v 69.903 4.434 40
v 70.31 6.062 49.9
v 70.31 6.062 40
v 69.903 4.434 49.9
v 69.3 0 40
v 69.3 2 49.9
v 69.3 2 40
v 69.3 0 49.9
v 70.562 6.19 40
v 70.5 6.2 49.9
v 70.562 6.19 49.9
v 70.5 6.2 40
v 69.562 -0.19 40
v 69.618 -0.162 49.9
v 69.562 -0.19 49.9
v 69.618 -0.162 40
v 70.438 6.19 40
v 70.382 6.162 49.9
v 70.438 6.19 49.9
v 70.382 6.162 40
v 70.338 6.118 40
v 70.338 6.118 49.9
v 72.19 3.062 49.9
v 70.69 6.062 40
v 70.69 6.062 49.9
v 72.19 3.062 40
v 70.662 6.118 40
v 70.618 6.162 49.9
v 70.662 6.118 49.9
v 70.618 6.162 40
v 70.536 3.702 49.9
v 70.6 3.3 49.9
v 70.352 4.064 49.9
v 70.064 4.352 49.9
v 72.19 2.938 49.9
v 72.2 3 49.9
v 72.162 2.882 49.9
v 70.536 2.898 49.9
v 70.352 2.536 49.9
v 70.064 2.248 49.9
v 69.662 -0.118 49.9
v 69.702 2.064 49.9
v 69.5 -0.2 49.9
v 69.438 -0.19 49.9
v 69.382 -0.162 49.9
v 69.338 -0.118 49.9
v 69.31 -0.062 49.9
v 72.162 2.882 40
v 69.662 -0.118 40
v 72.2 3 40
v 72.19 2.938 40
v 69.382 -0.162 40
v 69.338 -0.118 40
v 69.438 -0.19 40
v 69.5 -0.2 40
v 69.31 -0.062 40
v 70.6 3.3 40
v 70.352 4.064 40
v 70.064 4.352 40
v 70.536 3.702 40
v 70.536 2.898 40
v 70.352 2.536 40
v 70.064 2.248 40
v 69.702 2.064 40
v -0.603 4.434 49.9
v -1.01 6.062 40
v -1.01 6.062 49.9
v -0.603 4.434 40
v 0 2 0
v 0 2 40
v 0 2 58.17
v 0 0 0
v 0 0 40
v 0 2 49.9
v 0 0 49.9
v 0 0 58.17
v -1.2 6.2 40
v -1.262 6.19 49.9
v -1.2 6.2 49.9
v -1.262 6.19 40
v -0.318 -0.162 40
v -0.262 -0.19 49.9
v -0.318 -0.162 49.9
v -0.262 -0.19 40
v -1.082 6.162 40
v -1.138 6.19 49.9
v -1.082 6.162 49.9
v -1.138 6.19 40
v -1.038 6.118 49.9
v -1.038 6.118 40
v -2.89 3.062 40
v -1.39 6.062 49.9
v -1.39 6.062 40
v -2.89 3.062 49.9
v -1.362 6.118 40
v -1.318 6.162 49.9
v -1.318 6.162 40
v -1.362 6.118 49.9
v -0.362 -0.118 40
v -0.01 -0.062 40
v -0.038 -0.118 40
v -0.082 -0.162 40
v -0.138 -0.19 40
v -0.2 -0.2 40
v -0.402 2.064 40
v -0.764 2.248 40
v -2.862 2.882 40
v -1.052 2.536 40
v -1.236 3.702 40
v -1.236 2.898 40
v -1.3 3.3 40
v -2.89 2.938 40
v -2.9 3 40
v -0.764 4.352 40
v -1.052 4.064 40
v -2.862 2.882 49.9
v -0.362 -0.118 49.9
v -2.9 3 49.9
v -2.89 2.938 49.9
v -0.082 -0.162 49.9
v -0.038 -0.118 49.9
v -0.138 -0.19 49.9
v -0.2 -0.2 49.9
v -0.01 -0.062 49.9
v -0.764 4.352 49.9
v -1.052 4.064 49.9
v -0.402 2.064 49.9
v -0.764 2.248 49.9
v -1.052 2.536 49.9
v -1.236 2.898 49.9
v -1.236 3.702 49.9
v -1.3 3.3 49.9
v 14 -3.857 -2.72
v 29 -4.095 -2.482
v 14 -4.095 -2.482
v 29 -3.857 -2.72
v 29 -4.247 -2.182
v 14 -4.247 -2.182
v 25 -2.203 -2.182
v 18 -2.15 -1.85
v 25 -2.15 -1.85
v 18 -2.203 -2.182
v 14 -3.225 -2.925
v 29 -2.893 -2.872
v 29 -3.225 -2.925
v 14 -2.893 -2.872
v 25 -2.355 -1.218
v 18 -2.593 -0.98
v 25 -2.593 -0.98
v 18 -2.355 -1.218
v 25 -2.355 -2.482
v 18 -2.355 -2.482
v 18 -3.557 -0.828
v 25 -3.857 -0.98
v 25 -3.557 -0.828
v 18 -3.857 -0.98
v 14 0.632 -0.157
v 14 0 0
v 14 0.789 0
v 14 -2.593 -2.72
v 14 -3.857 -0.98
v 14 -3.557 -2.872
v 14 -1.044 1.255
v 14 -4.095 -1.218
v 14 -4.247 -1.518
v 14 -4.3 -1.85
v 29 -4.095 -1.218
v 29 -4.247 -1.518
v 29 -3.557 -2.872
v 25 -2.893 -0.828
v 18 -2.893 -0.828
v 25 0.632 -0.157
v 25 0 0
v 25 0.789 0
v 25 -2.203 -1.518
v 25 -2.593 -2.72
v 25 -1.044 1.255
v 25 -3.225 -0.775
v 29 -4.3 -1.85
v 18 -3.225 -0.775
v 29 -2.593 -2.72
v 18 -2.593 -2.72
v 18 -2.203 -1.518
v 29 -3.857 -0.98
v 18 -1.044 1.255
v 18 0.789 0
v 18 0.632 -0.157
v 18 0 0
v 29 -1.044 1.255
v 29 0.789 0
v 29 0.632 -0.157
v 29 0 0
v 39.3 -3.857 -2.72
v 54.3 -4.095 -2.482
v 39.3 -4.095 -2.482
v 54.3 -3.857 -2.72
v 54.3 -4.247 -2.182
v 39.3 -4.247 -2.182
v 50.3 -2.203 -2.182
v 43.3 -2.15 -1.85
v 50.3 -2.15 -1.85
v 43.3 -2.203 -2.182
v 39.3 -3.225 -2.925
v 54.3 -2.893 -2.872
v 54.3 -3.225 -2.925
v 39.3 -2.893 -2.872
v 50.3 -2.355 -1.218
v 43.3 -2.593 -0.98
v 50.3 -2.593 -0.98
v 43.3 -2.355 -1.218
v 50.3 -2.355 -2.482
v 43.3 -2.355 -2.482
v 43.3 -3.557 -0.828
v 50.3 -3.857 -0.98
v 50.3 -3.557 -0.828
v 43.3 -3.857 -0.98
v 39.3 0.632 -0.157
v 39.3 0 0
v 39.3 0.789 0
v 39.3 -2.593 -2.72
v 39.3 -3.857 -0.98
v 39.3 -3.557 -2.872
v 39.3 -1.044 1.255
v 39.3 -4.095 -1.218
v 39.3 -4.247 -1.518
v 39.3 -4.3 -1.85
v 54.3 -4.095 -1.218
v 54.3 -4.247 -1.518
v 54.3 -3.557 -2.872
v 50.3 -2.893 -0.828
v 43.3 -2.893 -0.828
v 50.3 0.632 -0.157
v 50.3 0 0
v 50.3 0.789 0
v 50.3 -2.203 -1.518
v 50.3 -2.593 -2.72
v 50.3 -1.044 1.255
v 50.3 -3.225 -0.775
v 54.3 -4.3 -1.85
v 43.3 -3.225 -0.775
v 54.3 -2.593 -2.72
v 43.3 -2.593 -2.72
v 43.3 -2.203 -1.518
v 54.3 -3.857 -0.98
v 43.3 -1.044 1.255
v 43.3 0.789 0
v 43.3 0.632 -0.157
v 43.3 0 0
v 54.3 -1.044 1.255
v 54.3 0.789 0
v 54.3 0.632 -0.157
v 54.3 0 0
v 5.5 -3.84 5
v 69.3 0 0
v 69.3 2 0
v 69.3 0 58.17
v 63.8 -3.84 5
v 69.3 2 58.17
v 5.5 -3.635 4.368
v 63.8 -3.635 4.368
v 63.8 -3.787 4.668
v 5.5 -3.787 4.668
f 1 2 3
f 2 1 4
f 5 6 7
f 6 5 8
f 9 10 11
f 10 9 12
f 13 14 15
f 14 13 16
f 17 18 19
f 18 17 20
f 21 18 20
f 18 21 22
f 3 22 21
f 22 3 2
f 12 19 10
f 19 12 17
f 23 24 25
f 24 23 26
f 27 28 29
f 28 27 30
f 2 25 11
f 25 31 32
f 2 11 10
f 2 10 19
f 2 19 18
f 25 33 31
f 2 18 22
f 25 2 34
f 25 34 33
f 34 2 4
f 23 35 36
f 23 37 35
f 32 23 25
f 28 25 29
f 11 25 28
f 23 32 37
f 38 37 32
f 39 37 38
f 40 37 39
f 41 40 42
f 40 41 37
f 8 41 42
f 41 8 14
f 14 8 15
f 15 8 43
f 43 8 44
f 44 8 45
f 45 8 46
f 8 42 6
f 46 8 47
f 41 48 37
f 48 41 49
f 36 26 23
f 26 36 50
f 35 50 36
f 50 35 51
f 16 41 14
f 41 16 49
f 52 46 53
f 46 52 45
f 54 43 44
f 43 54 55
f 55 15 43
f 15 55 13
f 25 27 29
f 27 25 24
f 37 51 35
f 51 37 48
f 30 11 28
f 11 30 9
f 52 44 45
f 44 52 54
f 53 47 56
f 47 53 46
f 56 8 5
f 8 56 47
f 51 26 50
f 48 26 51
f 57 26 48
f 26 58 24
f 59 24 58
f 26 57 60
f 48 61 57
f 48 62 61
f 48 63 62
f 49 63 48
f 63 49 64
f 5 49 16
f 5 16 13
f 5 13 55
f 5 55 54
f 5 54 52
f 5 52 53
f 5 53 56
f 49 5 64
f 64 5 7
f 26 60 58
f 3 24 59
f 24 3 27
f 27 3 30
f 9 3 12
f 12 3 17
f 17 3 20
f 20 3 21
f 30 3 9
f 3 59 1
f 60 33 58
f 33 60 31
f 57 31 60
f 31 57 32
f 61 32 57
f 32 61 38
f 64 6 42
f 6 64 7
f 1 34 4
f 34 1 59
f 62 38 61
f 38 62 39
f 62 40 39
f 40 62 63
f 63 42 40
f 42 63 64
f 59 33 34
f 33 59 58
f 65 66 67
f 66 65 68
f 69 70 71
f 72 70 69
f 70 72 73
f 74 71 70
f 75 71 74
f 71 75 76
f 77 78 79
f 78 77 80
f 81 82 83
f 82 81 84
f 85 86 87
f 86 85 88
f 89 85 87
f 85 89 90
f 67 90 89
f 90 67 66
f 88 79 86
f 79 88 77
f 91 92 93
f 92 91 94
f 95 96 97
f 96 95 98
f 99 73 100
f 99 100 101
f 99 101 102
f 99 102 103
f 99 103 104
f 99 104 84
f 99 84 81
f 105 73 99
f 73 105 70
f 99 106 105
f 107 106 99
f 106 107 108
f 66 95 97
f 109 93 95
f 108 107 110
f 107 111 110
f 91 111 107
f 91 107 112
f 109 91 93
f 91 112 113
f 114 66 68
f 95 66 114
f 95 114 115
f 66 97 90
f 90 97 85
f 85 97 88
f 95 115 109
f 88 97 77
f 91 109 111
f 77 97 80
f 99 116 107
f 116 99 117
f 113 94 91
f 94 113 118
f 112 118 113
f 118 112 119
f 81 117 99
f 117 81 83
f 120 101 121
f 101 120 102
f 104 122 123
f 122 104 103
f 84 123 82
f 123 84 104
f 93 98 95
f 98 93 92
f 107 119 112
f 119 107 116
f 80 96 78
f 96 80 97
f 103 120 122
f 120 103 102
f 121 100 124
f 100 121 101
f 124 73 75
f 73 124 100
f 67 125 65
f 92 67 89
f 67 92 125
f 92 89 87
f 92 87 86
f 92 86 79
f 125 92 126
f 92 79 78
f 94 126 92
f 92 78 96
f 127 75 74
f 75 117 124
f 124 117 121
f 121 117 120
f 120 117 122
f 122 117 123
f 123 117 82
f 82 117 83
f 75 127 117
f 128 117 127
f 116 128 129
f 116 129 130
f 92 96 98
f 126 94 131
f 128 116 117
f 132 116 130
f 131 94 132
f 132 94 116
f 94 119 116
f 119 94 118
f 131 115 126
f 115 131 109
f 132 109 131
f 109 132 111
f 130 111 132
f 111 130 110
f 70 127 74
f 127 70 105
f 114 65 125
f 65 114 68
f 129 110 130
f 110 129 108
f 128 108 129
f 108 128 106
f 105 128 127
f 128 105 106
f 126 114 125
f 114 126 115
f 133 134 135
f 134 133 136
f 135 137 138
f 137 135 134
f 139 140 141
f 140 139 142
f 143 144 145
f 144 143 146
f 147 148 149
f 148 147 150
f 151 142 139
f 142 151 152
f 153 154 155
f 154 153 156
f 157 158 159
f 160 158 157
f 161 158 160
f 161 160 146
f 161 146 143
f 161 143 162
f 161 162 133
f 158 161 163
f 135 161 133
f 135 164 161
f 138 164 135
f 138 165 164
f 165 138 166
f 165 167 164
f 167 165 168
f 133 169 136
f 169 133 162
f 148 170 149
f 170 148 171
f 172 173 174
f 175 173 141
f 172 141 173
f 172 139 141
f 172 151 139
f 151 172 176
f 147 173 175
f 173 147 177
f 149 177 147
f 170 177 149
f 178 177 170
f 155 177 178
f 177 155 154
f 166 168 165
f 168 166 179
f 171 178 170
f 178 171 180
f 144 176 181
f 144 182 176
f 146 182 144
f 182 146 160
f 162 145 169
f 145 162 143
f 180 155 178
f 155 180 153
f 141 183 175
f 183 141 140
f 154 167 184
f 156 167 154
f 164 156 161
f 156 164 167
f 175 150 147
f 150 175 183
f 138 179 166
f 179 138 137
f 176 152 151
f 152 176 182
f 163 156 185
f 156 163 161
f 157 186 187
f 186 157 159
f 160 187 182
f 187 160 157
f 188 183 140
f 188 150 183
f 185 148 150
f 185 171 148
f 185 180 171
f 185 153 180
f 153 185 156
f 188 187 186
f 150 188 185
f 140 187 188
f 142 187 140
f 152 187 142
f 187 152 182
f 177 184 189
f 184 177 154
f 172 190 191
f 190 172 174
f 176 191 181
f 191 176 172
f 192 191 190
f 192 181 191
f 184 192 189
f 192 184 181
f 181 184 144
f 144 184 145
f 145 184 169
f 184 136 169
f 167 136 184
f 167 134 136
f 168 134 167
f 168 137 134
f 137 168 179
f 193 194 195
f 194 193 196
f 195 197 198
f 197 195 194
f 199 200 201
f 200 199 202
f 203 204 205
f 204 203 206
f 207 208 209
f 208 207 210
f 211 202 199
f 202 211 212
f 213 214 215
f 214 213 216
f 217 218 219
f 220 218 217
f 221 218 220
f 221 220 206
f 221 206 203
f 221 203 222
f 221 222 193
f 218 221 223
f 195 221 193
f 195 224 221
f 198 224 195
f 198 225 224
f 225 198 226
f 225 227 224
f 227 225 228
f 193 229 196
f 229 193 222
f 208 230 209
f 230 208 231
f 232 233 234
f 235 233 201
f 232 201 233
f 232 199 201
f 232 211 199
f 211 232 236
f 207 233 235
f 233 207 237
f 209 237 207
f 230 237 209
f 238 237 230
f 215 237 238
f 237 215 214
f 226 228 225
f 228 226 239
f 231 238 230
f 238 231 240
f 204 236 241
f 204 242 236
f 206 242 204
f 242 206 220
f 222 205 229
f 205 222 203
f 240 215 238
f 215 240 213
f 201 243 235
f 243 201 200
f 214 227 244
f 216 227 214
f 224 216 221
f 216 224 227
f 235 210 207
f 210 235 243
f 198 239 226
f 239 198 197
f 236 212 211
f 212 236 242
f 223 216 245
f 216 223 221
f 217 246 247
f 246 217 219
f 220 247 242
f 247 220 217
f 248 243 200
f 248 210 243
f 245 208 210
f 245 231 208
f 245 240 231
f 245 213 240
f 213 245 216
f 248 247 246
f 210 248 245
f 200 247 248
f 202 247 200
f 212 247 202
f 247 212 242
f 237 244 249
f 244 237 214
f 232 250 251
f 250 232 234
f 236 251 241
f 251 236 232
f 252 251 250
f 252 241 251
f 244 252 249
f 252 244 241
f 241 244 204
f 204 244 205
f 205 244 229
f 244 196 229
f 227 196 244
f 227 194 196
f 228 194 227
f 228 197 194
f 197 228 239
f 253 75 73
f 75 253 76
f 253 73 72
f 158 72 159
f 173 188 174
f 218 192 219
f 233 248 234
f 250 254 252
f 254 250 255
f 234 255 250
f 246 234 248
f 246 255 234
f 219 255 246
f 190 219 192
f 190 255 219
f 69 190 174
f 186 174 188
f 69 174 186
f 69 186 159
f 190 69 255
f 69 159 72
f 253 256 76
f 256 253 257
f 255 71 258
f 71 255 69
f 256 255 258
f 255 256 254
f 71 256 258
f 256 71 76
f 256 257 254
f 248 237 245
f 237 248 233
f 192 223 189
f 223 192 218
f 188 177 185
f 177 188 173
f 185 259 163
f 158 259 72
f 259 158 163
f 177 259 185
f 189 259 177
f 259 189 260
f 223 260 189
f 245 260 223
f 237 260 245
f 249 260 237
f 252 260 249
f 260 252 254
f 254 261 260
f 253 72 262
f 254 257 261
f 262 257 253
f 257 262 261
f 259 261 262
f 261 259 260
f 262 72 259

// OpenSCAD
DOOR_OUTER_WIDTH = 69.3;
FLOOR_TO_OUTER_HEIGHT = 58.17;
GATE_MATERIAL_HEIGHT = 2.0;
FLOOR_MATERIAL_HEIGHT = 3.85;

SIDE_CLIP_PETRUSION = 1.3;
SIDE_CLIP_PETRUSION_DEPTH = 2.0;
SIDE_CLIP_FROM_FLOOR = 40.0;
SIDE_CLIP_HEIGHT = 9.9;


// The ramp attachment
RAMP_ATTACH_DIAMETER = 2.15;
TAILGET_EDGE_TO_WALL = 9.1;
TAILGATE_EDGE_TO_INNER_ATTACHMENT= 5.45;
ATTACH_OFFSET_OUTER_WALL = 19.0;
ATTCH_LENGTH = 11.0;
RECESS_HEIGHT = FLOOR_MATERIAL_HEIGHT - GATE_MATERIAL_HEIGHT;
ATTACH_DISTANCE_FROM_RAMP = -TAILGET_EDGE_TO_WALL + TAILGATE_EDGE_TO_INNER_ATTACHMENT - RAMP_ATTACH_DIAMETER/2 + 1.5;


module latch() {
    difference() {
        translate([0.2,0,0])
            hull() {
                cylinder(h=SIDE_CLIP_HEIGHT, r=0.2, $fn = 20);
                translate([0,GATE_MATERIAL_HEIGHT,0])
                    cylinder(h=SIDE_CLIP_HEIGHT, r=0.2, $fn = 20);
                translate([1.0,GATE_MATERIAL_HEIGHT + SIDE_CLIP_PETRUSION_DEPTH * 2,0])
                    cylinder(h=SIDE_CLIP_HEIGHT, r=0.2, $fn = 20);
                translate([GATE_MATERIAL_HEIGHT*1.25,GATE_MATERIAL_HEIGHT+1.0,0])
                    cylinder(h=SIDE_CLIP_HEIGHT, r=0.2, $fn = 20);
            }
        translate([0,GATE_MATERIAL_HEIGHT+1.3,-0.1])
            cylinder(h=12.0,r=SIDE_CLIP_PETRUSION,$fn=20);
    }
}

module main_door() {
    hull() {
        cube([DOOR_OUTER_WIDTH,GATE_MATERIAL_HEIGHT,FLOOR_TO_OUTER_HEIGHT]);
        translate([ATTCH_LENGTH/2,ATTACH_DISTANCE_FROM_RAMP+0.46, 5])
            rotate([0,90,0])
                cylinder(h = DOOR_OUTER_WIDTH-ATTCH_LENGTH, r = RAMP_ATTACH_DIAMETER / 2.0, $fn = 20);
    }
    
    // Side attachments
    translate([DOOR_OUTER_WIDTH, 0, SIDE_CLIP_FROM_FLOOR])
        latch();
    translate([0, 0, SIDE_CLIP_FROM_FLOOR+SIDE_CLIP_HEIGHT])
        rotate([0,180,0]) latch();
    
    // Ramp attachment
    translate([ATTACH_OFFSET_OUTER_WALL-5.0,0,0]) ramp_attach();
    translate([DOOR_OUTER_WIDTH-ATTACH_OFFSET_OUTER_WALL-ATTCH_LENGTH,0,0])
        ramp_attach();
}

module ramp_attach() {        
    translate([0, ATTACH_DISTANCE_FROM_RAMP, -RECESS_HEIGHT])
        rotate([0,90,0])
            cylinder(h = ATTCH_LENGTH, r = RAMP_ATTACH_DIAMETER / 2.0, $fn = 20);
    
    hull() {
        translate([0,ATTACH_DISTANCE_FROM_RAMP, -RECESS_HEIGHT])
            rotate([0,90,0])
                cylinder(h = 4, r = RAMP_ATTACH_DIAMETER / 2.0, $fn = 20);
        translate([0,0, -ATTACH_DISTANCE_FROM_RAMP/2 - 0.9])
            rotate([0,90,0])
                cylinder(h = 4, r = RAMP_ATTACH_DIAMETER / 2.0, $fn = 20);
    }
    hull() {
        translate([ATTCH_LENGTH,ATTACH_DISTANCE_FROM_RAMP, -RECESS_HEIGHT])
            rotate([0,90,0])
                cylinder(h = 4, r = RAMP_ATTACH_DIAMETER / 2.0, $fn = 20);
        translate([ATTCH_LENGTH,0, -ATTACH_DISTANCE_FROM_RAMP/2 - 0.9])
            rotate([0,90,0])
                cylinder(h = 4, r = RAMP_ATTACH_DIAMETER / 2.0, $fn = 20);
    }
}

main_door();

// For test
//#translate([ATTACH_OFFSET_OUTER_WALL,-4.35,-RECESS_HEIGHT]) cube([5,2.25,3]);
//#translate([44.5,-4.35,-RECESS_HEIGHT]) cube([5,2.25,3]);
